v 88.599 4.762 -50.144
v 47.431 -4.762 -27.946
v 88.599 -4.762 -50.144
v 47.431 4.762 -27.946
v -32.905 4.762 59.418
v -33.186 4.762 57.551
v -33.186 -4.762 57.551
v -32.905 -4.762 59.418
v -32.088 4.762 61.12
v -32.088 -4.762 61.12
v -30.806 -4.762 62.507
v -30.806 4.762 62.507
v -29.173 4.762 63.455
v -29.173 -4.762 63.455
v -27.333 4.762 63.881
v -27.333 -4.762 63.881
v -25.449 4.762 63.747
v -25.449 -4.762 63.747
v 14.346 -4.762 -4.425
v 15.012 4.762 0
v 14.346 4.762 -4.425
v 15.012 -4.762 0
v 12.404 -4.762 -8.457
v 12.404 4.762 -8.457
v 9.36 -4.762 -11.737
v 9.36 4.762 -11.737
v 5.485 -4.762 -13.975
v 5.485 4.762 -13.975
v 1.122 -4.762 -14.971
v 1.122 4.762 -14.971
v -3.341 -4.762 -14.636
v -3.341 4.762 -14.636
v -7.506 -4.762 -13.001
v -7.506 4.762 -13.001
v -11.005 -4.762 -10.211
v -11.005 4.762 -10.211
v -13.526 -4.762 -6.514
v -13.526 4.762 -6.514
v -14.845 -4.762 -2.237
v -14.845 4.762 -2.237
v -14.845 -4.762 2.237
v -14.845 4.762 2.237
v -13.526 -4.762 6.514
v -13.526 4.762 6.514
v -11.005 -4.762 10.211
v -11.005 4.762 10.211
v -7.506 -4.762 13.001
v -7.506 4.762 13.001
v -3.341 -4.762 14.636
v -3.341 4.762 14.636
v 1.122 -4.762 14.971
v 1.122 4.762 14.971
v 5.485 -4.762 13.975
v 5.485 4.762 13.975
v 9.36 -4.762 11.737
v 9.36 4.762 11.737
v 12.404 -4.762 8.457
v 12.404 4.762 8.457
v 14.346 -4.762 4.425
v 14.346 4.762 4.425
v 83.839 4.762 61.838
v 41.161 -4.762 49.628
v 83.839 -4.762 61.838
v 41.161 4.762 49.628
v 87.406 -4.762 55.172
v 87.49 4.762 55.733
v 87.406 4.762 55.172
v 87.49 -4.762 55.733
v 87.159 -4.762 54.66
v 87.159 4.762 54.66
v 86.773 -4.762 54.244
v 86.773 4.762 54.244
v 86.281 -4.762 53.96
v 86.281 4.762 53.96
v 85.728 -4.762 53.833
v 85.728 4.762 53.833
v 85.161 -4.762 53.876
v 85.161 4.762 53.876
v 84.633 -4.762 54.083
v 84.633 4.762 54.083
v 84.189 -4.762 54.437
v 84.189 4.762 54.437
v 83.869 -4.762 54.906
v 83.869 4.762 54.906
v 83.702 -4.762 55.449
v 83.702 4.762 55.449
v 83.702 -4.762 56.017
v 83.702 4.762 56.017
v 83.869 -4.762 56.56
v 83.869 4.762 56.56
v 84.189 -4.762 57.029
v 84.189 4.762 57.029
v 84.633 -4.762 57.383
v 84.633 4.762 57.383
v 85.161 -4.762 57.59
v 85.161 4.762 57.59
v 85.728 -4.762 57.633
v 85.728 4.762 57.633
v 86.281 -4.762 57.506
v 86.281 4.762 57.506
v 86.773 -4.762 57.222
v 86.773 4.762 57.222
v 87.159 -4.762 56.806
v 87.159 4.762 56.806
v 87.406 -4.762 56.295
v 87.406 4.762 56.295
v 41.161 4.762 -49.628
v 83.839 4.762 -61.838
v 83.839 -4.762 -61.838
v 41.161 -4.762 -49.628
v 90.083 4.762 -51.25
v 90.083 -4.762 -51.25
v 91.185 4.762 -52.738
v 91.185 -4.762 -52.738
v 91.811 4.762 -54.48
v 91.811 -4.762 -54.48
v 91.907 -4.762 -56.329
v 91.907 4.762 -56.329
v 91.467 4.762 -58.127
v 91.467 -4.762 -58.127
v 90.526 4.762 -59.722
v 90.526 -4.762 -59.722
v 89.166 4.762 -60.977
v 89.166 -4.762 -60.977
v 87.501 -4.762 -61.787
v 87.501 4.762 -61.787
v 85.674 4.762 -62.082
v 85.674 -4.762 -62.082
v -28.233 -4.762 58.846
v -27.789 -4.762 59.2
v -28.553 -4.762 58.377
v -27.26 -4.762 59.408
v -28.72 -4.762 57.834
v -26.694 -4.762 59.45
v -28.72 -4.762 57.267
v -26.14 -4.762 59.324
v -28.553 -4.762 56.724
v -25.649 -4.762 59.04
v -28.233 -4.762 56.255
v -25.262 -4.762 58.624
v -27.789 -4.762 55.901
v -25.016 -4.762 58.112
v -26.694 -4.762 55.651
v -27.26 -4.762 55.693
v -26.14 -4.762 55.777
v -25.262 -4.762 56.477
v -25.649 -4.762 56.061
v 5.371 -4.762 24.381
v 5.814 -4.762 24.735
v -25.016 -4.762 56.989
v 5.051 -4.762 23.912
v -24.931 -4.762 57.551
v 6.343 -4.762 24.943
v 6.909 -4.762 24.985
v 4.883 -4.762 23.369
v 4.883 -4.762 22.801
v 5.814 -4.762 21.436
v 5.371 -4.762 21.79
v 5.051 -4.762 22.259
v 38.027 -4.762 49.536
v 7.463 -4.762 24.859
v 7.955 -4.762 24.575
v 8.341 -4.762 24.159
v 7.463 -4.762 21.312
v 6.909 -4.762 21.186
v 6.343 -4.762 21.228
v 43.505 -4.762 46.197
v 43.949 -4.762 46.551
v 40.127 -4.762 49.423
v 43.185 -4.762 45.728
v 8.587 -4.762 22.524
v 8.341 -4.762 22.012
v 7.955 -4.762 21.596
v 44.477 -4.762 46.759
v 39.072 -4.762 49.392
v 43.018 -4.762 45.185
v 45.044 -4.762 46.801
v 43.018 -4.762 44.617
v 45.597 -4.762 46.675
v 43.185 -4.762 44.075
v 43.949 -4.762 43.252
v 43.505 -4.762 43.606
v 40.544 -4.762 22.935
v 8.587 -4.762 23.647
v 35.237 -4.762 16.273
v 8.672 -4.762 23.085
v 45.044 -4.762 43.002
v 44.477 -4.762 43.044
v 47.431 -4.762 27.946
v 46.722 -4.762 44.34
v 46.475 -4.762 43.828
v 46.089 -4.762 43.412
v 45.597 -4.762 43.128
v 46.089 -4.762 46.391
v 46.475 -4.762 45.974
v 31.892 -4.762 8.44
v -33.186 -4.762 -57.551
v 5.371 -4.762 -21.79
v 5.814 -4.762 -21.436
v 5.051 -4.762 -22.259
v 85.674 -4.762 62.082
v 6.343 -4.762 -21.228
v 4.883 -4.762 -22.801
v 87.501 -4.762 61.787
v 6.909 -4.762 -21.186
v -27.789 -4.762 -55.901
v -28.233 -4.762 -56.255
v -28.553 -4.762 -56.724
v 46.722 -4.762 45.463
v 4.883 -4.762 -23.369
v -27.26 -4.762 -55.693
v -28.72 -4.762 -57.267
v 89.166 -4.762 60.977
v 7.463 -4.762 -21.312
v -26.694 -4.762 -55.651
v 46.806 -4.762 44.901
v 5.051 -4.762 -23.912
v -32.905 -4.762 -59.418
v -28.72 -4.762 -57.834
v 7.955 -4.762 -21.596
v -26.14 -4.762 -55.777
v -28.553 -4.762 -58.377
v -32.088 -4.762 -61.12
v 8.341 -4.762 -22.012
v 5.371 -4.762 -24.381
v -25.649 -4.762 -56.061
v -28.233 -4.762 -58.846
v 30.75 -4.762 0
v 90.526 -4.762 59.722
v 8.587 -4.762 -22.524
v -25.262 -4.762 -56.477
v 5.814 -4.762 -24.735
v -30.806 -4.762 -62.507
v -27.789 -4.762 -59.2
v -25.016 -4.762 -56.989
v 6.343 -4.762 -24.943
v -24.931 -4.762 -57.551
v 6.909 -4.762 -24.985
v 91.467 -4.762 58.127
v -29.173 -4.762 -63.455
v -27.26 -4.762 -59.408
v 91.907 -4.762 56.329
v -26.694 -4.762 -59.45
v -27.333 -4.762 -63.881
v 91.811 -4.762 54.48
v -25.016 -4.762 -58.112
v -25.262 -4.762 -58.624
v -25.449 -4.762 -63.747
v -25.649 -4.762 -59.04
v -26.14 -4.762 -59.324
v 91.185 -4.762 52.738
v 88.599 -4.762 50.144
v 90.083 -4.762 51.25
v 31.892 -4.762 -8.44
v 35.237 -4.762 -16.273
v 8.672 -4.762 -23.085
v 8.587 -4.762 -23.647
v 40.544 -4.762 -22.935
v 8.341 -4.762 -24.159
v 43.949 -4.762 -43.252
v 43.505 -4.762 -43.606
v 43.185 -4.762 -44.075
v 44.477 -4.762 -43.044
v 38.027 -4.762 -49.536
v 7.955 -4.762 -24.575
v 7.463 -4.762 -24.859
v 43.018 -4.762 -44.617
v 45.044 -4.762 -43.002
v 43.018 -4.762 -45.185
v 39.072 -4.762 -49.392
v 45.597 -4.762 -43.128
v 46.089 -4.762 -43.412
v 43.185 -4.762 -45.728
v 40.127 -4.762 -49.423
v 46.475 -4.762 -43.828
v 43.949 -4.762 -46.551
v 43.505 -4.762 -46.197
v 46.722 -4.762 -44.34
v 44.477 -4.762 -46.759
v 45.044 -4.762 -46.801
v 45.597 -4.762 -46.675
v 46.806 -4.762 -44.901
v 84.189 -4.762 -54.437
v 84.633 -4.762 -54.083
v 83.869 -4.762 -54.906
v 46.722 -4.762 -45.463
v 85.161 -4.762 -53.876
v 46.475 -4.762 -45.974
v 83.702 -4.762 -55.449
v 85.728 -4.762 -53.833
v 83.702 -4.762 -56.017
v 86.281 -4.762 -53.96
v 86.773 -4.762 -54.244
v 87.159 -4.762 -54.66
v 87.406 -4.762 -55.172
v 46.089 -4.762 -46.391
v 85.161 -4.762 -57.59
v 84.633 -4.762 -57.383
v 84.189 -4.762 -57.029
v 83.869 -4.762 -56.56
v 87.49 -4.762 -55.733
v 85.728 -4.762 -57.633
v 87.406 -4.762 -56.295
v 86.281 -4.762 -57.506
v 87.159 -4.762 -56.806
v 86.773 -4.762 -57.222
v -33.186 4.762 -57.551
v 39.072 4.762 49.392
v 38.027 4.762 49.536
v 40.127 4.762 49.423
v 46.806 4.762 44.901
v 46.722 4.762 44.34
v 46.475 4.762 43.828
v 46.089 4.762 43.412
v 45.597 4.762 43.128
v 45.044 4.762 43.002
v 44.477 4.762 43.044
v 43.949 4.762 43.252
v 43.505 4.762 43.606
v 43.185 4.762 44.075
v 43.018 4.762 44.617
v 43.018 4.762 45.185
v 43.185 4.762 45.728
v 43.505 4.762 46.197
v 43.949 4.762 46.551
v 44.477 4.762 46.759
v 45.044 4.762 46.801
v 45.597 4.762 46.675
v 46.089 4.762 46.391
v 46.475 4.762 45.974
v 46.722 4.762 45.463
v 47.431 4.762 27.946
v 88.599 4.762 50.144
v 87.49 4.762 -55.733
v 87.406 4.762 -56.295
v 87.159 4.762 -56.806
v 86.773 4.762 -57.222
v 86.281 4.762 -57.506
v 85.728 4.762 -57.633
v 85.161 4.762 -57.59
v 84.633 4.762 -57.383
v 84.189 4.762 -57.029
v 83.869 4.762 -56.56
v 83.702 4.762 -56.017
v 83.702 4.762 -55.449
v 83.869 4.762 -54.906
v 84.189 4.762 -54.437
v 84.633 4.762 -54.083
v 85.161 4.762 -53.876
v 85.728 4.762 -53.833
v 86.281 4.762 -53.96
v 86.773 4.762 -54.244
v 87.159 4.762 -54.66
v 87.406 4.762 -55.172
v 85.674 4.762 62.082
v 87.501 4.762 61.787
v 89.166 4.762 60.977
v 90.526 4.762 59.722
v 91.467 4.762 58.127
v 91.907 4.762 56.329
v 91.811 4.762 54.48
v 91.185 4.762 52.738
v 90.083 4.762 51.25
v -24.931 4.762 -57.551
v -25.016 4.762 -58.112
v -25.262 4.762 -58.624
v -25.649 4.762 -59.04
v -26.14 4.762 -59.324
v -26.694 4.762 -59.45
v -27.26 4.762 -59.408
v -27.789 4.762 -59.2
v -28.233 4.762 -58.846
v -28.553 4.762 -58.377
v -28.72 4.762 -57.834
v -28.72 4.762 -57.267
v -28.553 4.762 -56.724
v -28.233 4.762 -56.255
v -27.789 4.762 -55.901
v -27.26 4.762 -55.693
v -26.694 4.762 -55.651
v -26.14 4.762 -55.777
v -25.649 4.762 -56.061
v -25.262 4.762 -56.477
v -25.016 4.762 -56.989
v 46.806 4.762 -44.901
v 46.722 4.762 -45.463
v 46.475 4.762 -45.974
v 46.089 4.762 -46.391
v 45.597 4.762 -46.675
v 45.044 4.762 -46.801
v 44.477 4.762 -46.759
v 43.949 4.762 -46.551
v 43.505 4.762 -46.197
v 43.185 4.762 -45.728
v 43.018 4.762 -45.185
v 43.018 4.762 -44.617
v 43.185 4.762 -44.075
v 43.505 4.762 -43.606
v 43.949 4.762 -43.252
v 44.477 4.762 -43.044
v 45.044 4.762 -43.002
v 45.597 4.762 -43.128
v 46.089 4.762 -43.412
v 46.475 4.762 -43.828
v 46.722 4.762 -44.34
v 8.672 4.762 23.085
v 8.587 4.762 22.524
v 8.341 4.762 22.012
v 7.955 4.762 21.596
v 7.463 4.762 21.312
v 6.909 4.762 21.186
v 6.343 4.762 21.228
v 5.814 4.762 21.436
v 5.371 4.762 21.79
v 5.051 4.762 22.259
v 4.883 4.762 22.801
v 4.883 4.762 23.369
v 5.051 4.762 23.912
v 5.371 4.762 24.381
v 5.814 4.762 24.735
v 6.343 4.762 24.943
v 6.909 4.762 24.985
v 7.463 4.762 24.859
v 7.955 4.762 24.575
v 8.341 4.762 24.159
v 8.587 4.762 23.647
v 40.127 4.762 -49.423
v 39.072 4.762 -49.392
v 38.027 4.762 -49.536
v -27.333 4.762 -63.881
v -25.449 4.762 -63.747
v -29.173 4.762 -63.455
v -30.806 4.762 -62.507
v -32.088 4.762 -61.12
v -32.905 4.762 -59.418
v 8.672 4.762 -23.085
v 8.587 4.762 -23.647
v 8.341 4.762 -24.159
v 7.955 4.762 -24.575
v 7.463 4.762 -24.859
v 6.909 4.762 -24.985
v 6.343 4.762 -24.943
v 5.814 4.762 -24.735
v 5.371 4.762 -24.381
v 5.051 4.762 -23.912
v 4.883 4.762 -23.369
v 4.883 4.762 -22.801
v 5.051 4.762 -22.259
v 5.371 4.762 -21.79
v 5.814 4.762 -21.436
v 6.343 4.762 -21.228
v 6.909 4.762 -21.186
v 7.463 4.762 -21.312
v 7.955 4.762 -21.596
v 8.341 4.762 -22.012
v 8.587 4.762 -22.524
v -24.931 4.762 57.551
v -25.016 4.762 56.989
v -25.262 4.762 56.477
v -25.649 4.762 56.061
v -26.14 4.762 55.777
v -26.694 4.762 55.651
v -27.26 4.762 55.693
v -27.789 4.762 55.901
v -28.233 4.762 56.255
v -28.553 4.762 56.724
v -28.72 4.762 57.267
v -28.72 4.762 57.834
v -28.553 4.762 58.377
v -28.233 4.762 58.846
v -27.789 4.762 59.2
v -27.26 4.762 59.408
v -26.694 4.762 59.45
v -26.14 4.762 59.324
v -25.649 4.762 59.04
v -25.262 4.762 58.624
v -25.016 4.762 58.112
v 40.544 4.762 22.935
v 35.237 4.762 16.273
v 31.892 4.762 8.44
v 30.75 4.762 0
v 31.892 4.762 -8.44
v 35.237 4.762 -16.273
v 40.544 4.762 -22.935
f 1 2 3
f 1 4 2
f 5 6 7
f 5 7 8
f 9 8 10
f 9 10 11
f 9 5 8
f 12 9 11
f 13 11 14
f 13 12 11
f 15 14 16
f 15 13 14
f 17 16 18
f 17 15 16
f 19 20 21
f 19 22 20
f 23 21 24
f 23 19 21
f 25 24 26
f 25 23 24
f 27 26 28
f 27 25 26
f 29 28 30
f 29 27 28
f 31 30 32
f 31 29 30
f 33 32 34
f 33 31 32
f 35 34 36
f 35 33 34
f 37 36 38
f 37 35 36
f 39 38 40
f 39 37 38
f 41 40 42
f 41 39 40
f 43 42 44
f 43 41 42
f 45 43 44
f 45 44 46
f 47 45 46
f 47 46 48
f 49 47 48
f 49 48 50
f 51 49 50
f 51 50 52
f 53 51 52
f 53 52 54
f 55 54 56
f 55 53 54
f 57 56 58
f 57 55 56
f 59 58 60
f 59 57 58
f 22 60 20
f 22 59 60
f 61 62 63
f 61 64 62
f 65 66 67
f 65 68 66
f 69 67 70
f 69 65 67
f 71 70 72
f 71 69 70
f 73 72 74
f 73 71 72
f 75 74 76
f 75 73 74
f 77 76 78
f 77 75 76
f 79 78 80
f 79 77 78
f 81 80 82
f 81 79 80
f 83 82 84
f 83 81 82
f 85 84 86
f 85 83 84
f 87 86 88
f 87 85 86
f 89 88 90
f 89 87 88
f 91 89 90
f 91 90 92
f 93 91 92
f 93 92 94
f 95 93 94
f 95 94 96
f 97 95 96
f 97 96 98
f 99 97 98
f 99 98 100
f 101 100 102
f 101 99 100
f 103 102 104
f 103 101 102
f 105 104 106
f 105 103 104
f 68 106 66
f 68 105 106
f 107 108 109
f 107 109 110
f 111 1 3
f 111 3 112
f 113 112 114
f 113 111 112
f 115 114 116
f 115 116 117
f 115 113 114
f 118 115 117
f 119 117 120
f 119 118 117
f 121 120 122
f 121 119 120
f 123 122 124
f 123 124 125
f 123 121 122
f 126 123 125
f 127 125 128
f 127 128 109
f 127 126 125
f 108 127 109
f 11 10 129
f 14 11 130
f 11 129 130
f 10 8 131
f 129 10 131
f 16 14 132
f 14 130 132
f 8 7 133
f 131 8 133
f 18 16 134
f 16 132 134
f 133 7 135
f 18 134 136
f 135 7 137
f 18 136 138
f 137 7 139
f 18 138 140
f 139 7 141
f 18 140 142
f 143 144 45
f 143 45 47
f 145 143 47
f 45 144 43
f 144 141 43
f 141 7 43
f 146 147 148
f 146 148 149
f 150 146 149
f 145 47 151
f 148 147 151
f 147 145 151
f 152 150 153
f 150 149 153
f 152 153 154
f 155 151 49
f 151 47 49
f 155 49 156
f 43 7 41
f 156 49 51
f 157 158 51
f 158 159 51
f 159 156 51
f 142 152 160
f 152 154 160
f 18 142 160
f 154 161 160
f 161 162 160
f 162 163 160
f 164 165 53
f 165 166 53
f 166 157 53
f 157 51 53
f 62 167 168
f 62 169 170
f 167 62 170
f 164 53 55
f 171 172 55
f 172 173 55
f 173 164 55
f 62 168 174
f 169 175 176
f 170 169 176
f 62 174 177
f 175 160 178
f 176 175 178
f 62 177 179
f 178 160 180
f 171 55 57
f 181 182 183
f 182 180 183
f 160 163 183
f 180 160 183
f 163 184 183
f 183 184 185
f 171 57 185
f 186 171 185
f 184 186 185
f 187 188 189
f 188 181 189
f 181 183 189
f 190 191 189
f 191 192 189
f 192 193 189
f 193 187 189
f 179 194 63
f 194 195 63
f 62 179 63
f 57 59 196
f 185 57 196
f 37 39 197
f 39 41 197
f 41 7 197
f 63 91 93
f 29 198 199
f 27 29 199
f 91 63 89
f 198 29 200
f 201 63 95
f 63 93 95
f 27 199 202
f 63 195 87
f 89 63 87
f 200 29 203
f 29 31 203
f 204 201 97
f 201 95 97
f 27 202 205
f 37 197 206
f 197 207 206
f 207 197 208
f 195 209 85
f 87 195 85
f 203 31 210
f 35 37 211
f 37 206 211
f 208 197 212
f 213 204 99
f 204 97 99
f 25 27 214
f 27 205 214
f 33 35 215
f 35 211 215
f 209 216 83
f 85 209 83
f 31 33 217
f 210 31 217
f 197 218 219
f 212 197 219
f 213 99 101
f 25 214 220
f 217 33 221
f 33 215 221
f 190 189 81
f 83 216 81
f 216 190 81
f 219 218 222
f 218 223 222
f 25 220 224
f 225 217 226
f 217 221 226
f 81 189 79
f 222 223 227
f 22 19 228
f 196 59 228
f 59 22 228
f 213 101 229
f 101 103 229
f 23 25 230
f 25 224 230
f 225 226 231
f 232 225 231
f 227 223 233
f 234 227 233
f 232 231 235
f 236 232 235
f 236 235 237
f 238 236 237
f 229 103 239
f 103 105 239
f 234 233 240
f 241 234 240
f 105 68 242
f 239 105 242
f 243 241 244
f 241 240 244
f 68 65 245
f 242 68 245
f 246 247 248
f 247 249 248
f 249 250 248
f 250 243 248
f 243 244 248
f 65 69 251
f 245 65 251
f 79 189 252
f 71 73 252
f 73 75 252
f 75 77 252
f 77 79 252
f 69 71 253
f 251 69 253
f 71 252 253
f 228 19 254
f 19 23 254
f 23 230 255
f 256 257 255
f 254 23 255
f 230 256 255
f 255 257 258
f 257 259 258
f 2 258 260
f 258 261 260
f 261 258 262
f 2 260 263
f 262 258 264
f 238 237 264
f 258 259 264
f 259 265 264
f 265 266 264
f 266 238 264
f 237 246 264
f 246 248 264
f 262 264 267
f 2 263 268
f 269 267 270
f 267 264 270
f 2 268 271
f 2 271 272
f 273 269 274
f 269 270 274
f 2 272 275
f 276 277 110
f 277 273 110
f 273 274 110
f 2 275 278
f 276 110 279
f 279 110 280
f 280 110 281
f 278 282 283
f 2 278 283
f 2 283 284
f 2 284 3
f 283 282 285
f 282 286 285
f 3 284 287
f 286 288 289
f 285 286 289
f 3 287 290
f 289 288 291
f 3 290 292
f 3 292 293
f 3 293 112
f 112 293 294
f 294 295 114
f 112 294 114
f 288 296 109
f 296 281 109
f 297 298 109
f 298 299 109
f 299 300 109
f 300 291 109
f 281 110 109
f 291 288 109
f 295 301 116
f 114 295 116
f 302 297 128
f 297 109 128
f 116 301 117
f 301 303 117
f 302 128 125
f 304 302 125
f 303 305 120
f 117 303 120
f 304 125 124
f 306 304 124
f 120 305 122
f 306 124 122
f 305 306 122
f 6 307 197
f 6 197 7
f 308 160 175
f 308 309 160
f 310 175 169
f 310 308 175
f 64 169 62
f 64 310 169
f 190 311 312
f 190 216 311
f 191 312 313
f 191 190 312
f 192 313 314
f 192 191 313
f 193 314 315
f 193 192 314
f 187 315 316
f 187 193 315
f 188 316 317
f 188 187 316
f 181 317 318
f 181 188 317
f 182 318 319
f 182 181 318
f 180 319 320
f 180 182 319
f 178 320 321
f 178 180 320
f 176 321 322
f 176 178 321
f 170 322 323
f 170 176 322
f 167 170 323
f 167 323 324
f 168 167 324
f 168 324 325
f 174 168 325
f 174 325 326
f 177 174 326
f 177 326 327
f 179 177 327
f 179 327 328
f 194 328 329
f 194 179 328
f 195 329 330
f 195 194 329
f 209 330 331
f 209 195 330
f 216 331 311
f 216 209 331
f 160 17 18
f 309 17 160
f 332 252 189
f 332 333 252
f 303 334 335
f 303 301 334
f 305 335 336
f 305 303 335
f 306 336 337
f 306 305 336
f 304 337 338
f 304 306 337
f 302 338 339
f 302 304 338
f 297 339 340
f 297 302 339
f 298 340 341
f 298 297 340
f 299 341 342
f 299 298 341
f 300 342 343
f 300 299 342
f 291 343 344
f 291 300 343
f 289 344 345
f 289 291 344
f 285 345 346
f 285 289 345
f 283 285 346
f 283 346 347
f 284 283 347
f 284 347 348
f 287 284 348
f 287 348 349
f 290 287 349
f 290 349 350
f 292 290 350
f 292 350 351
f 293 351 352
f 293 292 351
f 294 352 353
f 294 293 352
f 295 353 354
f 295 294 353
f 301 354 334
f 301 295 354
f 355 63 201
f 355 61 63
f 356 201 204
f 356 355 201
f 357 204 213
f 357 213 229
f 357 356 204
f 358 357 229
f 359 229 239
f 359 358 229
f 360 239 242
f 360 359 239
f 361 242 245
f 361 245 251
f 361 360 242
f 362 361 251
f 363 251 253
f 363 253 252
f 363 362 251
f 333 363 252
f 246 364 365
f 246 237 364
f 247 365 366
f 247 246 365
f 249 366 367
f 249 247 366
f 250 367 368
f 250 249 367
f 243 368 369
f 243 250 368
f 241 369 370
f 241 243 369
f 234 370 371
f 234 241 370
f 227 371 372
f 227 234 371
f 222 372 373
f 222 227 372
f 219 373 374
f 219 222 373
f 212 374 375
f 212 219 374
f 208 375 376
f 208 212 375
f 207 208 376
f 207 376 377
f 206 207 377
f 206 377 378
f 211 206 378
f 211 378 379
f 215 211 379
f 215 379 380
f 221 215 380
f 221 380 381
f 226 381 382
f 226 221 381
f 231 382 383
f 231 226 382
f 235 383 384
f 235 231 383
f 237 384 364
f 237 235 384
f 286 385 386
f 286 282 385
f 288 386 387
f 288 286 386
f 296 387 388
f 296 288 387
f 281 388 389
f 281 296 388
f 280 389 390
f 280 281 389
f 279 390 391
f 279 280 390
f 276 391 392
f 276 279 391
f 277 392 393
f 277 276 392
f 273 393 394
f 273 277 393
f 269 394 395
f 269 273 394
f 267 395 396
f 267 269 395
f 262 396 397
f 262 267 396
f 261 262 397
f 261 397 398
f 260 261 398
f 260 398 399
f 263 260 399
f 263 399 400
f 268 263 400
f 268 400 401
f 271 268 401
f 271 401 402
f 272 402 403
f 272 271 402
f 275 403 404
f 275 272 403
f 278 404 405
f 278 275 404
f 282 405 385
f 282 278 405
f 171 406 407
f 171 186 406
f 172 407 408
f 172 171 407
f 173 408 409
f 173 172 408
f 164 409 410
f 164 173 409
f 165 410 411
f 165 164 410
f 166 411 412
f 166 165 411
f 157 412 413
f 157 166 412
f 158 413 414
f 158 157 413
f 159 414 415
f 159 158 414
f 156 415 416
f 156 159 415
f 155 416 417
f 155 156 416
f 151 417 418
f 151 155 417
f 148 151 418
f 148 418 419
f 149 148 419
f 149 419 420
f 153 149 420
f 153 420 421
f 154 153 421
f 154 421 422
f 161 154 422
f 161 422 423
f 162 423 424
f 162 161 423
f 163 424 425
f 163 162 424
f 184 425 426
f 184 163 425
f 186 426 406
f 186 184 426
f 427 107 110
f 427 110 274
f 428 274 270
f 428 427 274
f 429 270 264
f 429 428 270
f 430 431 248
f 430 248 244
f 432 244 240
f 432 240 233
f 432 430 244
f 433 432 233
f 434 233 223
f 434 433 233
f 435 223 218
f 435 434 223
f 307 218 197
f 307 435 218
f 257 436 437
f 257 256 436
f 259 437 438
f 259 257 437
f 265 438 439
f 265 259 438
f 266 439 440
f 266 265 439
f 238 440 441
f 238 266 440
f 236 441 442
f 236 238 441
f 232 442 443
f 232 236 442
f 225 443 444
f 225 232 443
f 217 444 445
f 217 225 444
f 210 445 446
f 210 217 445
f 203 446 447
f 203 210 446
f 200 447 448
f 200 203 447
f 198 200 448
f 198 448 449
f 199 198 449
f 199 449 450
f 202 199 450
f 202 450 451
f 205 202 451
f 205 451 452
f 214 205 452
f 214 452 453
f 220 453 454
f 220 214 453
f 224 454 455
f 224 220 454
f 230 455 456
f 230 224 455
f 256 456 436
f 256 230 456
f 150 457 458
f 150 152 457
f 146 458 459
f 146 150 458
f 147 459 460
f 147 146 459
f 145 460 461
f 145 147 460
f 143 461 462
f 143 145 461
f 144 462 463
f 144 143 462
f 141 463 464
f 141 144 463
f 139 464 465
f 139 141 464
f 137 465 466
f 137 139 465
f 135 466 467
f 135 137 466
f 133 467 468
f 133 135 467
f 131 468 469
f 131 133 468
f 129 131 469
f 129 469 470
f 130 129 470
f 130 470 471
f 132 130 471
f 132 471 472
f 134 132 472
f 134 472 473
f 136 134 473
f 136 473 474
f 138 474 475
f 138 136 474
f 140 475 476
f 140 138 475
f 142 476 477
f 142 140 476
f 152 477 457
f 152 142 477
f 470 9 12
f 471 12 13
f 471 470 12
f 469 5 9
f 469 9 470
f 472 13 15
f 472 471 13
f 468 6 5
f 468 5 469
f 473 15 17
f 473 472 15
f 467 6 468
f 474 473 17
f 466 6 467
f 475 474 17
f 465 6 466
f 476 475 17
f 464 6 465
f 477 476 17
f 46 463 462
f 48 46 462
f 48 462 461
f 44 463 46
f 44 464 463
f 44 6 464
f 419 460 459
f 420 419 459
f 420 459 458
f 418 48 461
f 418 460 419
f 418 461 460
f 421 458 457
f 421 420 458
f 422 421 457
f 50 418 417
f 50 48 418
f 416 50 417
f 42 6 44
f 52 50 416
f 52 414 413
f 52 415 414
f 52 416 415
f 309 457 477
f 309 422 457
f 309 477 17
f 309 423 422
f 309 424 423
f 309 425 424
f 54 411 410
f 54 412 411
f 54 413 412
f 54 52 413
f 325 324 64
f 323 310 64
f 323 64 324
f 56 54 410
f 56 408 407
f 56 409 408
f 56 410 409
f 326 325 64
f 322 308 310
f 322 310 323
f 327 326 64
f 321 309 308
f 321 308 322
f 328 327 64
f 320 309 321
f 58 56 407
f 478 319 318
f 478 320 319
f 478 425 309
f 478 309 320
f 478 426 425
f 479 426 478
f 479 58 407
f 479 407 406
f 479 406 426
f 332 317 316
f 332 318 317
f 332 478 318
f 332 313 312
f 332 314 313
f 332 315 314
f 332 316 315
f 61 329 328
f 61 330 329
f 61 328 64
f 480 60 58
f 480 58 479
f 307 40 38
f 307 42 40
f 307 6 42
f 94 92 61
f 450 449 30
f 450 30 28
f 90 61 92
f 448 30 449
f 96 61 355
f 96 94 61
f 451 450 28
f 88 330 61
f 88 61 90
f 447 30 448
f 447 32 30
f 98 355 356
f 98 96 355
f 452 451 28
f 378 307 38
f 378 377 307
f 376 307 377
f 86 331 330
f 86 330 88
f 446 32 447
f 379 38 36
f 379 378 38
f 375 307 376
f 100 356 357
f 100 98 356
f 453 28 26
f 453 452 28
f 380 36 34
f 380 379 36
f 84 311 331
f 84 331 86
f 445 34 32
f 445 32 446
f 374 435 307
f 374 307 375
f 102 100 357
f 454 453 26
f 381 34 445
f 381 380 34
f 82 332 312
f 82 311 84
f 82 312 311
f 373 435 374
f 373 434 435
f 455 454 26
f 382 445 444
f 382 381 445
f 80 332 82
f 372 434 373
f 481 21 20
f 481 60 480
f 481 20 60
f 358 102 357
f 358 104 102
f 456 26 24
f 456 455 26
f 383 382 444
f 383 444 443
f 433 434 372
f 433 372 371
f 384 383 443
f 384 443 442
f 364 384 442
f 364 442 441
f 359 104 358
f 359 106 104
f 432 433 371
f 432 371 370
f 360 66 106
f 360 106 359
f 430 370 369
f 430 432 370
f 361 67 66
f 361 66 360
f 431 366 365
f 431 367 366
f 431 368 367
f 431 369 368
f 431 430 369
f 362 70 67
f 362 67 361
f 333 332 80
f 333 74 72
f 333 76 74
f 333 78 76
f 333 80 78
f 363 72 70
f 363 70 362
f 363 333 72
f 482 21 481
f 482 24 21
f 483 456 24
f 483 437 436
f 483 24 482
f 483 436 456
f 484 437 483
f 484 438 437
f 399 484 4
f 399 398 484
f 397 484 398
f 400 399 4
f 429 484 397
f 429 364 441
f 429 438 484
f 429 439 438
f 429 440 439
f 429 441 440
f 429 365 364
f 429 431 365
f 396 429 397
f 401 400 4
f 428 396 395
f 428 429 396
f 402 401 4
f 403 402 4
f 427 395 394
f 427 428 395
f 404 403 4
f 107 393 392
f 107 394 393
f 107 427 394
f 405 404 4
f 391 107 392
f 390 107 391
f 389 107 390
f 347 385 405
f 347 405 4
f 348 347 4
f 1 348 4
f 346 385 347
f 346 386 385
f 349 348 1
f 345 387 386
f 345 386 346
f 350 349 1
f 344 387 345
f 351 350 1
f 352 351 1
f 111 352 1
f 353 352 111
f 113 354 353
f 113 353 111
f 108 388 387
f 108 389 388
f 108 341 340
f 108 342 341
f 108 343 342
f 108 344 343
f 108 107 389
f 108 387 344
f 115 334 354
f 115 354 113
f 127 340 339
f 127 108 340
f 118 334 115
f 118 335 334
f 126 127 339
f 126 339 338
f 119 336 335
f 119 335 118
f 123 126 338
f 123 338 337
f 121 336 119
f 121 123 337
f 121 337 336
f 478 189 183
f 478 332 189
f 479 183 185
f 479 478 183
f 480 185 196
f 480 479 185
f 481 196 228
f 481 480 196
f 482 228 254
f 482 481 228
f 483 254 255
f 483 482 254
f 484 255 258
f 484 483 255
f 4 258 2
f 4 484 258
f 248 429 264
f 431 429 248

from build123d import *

# Parameters (mm, degrees)
SKETCH2_R           = 1.905
SKETCH2_R_2         = 15.012499947
BOSS_EXTRUDE1_DEPTH = 4.7625


with BuildPart() as part:
    # Sketch2 → Boss-Extrude1 (new body, symmetric)
    with BuildSketch(Plane(origin=(0, 0, 0), x_dir=(1, 0, 0), z_dir=(0, 1, 0))):
        with BuildLine():
            Line((47.431459746, 27.946405755), (88.599086108, 50.143751648))
            ThreePointArc((88.599086108, 50.143751648), (91.466763895, 58.127150721), (83.838709673, 61.83808395))
            Line((83.838709673, 61.83808395), (41.161290327, 49.627981648))
            ThreePointArc((41.161290327, 49.627981648), (39.600064271, 49.38574116), (38.027358671, 49.536420772))
            Line((38.027358671, 49.536420772), (-25.448996349, 63.747156504))
            ThreePointArc((-25.448996349, 63.747156504), (-30.805729247, 62.50693539), (-33.186259621, 57.550544477))
            Line((-33.186259621, 57.550544477), (-33.186259621, -57.550544477))
            ThreePointArc((-33.186259621, -57.550544477), (-30.805729247, -62.50693539), (-25.448996349, -63.747156504))
            Line((-25.448996349, -63.747156504), (38.027358671, -49.536420772))
            ThreePointArc((38.027358671, -49.536420772), (39.600064271, -49.38574116), (41.161290327, -49.627981648))
            Line((41.161290327, -49.627981648), (83.838709673, -61.83808395))
            ThreePointArc((83.838709673, -61.83808395), (91.466763895, -58.127150721), (88.599086108, -50.143751648))
            Line((88.599086108, -50.143751648), (47.431459746, -27.946405755))
            ThreePointArc((47.431459746, -27.946405755), (30.75, 0), (47.431459746, 27.946405755))
        make_face()
        with Locations((6.766967201, -23.085378057)):
            Circle(SKETCH2_R, mode=Mode.SUBTRACT)
        with Locations((44.901280605, -44.901280605)):
            Circle(SKETCH2_R, mode=Mode.SUBTRACT)
        Circle(SKETCH2_R_2, mode=Mode.SUBTRACT)
        with Locations((6.766967201, 23.085378057)):
            Circle(SKETCH2_R, mode=Mode.SUBTRACT)
        with Locations((44.901280605, 44.901280605)):
            Circle(SKETCH2_R, mode=Mode.SUBTRACT)
        with Locations((85.585378057, 55.733032799)):
            Circle(SKETCH2_R, mode=Mode.SUBTRACT)
        with Locations((-26.836259621, 57.550544477)):
            Circle(SKETCH2_R, mode=Mode.SUBTRACT)
        with Locations((85.585378057, -55.733032799)):
            Circle(SKETCH2_R, mode=Mode.SUBTRACT)
        with Locations((-26.836259621, -57.550544477)):
            Circle(SKETCH2_R, mode=Mode.SUBTRACT)
    extrude(amount=BOSS_EXTRUDE1_DEPTH, both=True)


solid = part.part
